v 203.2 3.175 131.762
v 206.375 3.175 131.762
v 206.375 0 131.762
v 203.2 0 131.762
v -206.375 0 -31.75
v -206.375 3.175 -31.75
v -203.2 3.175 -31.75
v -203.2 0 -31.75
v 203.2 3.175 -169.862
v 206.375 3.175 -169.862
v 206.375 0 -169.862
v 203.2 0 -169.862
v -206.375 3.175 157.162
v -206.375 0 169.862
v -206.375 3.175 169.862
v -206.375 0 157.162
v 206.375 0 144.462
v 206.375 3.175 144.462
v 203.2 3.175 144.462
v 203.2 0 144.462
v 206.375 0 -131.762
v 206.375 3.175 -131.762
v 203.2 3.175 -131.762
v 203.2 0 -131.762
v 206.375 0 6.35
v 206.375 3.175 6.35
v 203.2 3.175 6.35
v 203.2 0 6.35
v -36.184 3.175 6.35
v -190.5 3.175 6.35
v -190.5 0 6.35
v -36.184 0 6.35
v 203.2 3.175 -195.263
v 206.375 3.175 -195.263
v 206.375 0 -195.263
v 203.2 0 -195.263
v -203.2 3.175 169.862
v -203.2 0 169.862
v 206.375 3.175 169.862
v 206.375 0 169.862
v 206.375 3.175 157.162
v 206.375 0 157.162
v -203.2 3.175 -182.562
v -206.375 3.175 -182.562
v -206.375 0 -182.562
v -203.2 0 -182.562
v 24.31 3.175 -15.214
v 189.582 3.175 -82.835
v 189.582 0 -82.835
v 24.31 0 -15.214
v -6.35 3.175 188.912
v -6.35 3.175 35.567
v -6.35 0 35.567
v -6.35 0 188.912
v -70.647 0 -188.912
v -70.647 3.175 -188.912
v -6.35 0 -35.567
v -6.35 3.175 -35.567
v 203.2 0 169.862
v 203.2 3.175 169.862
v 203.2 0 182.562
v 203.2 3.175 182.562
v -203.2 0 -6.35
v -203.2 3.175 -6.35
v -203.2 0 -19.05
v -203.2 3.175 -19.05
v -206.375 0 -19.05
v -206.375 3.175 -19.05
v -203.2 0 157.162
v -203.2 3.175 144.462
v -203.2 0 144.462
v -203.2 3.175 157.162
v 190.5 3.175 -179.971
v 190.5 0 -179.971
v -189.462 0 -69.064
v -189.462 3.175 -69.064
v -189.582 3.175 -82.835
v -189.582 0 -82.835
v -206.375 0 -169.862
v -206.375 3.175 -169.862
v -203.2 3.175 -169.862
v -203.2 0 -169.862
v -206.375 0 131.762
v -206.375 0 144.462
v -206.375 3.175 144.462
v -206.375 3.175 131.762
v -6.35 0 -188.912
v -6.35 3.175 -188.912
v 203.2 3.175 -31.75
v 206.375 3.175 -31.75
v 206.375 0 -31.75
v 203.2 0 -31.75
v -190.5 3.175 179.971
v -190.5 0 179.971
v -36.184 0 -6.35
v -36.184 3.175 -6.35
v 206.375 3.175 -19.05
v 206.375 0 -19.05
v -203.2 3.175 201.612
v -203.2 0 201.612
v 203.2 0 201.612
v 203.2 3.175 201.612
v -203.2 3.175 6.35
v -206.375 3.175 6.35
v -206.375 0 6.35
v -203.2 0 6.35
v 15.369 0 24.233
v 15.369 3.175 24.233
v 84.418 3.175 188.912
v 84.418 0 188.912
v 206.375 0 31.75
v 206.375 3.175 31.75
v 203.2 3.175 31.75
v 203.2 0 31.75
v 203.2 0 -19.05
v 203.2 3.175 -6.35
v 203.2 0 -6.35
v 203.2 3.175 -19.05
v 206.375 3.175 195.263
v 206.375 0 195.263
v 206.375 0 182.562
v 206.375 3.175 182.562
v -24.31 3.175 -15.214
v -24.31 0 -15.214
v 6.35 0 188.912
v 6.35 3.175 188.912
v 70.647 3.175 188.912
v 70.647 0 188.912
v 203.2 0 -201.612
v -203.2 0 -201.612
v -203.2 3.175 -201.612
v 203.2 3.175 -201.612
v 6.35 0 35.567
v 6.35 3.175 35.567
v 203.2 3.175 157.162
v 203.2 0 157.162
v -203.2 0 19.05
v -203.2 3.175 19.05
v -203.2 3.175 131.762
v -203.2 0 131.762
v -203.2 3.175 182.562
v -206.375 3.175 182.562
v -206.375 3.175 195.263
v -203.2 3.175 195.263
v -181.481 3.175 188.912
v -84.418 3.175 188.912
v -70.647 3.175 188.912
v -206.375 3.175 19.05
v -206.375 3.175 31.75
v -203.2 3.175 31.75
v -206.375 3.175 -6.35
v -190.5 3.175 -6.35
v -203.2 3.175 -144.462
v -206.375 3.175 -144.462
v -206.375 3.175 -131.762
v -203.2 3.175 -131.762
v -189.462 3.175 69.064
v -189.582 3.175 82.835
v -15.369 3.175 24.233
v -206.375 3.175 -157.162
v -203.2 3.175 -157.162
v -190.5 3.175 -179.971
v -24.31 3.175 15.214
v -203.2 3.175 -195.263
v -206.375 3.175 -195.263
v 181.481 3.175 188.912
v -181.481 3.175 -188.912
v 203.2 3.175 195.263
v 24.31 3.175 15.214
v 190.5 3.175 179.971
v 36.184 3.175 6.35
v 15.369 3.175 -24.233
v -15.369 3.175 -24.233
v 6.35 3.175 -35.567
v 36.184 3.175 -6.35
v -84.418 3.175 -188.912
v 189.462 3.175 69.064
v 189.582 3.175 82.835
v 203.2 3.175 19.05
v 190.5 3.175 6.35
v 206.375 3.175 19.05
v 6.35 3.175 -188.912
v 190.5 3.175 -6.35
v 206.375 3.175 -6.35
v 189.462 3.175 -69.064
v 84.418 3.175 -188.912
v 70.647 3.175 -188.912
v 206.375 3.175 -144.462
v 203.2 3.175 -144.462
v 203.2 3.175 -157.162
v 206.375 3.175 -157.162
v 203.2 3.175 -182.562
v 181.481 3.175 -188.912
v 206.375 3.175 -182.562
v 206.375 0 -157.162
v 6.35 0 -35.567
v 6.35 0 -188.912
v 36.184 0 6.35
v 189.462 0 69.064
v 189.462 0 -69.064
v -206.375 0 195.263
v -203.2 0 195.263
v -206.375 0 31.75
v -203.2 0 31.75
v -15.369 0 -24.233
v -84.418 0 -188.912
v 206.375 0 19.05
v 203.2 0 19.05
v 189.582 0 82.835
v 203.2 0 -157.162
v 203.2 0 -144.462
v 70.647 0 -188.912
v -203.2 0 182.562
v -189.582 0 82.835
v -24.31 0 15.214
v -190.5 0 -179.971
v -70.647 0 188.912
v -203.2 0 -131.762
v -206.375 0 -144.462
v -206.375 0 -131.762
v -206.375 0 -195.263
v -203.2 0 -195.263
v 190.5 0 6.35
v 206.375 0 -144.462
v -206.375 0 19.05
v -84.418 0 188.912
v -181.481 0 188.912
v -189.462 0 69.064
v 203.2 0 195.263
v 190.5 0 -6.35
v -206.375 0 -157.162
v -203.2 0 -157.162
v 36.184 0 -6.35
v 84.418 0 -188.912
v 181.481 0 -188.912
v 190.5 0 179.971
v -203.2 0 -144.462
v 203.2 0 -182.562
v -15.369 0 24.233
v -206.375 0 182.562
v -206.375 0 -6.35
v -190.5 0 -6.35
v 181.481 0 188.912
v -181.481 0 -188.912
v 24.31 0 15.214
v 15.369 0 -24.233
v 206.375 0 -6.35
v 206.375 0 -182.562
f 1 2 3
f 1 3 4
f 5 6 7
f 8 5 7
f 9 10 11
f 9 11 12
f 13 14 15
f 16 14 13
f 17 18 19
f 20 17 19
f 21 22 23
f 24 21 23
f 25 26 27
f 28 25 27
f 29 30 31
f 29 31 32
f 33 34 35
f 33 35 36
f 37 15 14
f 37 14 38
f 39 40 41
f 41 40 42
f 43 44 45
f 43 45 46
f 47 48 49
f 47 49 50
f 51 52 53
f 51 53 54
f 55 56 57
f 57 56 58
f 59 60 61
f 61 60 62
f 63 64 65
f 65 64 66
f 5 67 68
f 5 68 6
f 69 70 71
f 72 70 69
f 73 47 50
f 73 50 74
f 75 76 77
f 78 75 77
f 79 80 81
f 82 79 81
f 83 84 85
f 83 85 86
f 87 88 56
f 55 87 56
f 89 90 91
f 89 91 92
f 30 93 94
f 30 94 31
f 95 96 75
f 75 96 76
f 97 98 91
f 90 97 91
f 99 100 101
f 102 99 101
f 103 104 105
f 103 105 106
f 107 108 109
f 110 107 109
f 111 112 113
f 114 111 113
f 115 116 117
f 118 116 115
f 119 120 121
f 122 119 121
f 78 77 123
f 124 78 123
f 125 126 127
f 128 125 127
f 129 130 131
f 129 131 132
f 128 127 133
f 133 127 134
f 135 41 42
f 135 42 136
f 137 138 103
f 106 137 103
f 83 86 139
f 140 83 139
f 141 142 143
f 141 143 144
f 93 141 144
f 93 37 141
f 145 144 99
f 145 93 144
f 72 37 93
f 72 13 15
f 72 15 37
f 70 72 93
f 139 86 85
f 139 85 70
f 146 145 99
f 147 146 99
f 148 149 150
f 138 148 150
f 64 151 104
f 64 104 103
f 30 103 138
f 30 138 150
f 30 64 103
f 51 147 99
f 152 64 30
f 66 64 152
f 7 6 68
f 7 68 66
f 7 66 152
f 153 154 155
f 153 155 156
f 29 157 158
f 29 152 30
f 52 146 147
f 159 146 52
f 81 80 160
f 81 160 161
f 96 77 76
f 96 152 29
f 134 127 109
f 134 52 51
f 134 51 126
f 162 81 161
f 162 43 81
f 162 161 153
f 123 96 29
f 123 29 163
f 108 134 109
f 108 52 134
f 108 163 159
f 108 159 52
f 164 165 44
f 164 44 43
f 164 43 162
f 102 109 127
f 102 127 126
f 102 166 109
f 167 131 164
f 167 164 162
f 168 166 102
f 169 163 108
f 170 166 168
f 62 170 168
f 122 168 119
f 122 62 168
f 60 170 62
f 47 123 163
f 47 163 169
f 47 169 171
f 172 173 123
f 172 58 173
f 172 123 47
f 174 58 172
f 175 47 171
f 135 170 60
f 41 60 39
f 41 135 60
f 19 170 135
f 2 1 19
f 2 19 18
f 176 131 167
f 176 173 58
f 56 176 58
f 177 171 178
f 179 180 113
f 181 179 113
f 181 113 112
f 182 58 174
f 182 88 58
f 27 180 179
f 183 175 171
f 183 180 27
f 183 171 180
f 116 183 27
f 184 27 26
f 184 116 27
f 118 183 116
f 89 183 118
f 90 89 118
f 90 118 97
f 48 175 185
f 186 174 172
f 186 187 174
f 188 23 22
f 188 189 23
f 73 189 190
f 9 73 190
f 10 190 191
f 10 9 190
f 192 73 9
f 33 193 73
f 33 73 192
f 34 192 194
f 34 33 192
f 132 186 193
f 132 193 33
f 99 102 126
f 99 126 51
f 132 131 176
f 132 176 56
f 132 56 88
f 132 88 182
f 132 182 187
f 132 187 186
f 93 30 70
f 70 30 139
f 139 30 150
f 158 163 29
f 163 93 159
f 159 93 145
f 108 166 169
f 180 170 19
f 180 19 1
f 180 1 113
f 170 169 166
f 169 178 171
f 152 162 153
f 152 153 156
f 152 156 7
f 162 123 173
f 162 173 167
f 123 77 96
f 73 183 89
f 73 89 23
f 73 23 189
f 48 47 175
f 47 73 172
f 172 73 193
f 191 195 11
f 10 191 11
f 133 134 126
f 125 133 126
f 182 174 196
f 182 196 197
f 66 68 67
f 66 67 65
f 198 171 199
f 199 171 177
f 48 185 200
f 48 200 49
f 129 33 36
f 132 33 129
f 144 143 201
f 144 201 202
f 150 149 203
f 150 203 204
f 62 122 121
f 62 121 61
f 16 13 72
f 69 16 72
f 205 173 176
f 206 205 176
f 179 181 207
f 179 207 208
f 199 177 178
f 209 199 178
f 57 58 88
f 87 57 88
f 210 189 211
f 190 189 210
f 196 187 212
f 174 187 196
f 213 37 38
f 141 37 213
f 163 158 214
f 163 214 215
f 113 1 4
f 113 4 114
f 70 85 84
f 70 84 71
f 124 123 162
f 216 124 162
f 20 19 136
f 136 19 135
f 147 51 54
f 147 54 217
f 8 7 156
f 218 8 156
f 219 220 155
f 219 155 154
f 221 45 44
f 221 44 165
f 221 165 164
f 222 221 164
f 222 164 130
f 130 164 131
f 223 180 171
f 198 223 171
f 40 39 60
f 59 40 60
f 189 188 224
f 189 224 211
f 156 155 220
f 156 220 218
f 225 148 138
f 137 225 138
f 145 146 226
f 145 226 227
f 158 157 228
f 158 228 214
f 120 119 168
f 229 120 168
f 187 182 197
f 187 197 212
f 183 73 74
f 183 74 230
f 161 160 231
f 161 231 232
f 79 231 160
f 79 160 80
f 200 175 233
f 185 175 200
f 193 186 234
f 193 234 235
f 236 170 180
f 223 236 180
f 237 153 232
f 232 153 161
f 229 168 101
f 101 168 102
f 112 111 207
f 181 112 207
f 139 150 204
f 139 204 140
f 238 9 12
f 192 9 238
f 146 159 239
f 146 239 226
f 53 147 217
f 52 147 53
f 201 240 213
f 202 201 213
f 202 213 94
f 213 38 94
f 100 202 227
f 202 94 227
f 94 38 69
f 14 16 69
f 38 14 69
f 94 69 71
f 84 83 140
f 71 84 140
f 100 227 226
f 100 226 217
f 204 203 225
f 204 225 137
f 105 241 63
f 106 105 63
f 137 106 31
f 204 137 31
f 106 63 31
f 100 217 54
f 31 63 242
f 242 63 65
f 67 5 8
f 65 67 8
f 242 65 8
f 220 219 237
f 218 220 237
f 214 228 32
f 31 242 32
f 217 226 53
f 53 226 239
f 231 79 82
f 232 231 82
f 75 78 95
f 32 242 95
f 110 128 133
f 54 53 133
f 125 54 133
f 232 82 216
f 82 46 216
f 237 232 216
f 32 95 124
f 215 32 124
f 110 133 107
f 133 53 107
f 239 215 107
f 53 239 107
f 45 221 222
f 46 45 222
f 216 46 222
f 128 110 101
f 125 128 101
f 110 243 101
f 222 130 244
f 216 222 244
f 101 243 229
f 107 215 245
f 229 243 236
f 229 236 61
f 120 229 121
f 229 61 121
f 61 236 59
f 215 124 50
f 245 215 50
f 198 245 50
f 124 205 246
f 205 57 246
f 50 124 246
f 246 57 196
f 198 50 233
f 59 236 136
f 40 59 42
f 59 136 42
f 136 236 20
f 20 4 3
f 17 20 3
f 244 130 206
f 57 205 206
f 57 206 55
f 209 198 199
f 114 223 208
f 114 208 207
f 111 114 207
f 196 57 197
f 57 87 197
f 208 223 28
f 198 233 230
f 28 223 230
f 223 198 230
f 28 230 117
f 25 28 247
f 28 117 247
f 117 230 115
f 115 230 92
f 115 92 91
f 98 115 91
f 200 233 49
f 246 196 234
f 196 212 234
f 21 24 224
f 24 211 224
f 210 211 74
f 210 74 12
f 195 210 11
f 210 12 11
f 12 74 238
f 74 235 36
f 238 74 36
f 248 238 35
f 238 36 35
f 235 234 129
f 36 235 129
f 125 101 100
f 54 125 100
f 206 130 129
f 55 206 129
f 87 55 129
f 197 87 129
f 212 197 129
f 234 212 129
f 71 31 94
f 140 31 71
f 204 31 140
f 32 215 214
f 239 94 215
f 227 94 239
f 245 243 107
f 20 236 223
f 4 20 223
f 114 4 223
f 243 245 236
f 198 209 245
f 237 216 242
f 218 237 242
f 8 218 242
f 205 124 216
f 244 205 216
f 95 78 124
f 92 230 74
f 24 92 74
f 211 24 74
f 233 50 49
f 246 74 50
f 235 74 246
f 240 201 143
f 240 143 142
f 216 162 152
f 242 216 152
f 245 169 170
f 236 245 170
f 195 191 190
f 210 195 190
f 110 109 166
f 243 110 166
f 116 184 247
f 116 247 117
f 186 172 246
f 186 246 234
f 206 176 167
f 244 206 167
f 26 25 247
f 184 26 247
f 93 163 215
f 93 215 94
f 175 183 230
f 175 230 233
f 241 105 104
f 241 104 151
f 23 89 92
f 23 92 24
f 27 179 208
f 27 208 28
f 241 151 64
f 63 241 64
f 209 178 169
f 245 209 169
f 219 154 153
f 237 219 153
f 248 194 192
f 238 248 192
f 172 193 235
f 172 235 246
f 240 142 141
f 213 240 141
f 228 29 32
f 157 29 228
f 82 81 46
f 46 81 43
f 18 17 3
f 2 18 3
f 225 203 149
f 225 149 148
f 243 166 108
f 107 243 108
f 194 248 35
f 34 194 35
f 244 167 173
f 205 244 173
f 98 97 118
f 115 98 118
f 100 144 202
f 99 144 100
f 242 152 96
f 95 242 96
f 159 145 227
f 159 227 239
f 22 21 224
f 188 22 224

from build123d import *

# Parameters (mm, degrees)
SKETCH1_W               = 412.75
SKETCH1_H               = 403.225
BOSS_EXTRUDE1_DEPTH     = 3.175
SKETCH2_W               = 3.175
SKETCH2_H               = 87.3125
CUT_EXTRUDE1_DEPTH      = 3.175
SKETCH3_W               = 3.175
SKETCH3_H               = 12.7
CUT_EXTRUDE2_DEPTH      = 3.175
SKETCH4_W               = 3.175
SKETCH4_H               = 12.7
CUT_EXTRUDE3_DEPTH      = 3.175
MIRROR2_COPY_1_SKETCH_W = 3.175
MIRROR2_COPY_1_SKETCH_H = 12.7
MIRROR2_COPY_1_DEPTH    = 3.175
CUT_EXTRUDE4_DEPTH      = 3.175
MIRROR4_COPY_1_DEPTH    = 3.175


with BuildPart() as part:
    # Sketch1 → Boss-Extrude1 (new body)
    with BuildSketch(Plane(origin=(0, 0, 0), x_dir=(1, 0, 0), z_dir=(0, 1, 0))):
        Rectangle(SKETCH1_W, SKETCH1_H)
    extrude(amount=BOSS_EXTRUDE1_DEPTH)

    # Sketch2 → Cut-Extrude1 (cut)
    with BuildSketch(Plane(origin=(0, 3.175, 0), x_dir=(1, 0, 0), z_dir=(0, 1, 0))):
        with Locations((-204.7875, 81.75625)):
            Rectangle(SKETCH2_W, SKETCH2_H)
        with Locations((-204.7875, -81.75625)):
            Rectangle(SKETCH2_W, SKETCH2_H)
    cut_extrude1 = extrude(amount=-CUT_EXTRUDE1_DEPTH, mode=Mode.SUBTRACT)

    # Sketch3 → Cut-Extrude2 (cut)
    with BuildSketch(Plane(origin=(0, 3.175, 0), x_dir=(1, 0, 0), z_dir=(0, 1, 0))):
        with Locations((-204.7875, 201.6125)):
            Rectangle(SKETCH3_W, SKETCH3_H)
        with Locations((-204.7875, 176.2125)):
            Rectangle(SKETCH3_W, SKETCH3_H)
        with Locations((-204.7875, 150.8125)):
            Rectangle(SKETCH3_W, SKETCH3_H)
        with Locations((-204.7875, 125.4125)):
            Rectangle(SKETCH3_W, SKETCH3_H)
    cut_extrude2 = extrude(amount=-CUT_EXTRUDE2_DEPTH, mode=Mode.SUBTRACT)

    # Sketch4 → Cut-Extrude3 (cut)
    with BuildSketch(Plane(origin=(0, 3.175, 0), x_dir=(1, 0, 0), z_dir=(0, 1, 0))):
        with Locations((-204.7875, 38.1)):
            Rectangle(SKETCH4_W, SKETCH4_H)
        with Locations((-204.7875, 12.7)):
            Rectangle(SKETCH4_W, SKETCH4_H)
        with Locations((-204.7875, -12.7)):
            Rectangle(SKETCH4_W, SKETCH4_H)
        with Locations((-204.7875, -38.1)):
            Rectangle(SKETCH4_W, SKETCH4_H)
    cut_extrude3 = extrude(amount=-CUT_EXTRUDE3_DEPTH, mode=Mode.SUBTRACT)

    # Mirror1: Cut-Extrude2 across plane
    add(cut_extrude2.mirror(Plane.XY), mode=Mode.SUBTRACT)

    # Mirror2: Cut-Extrude1, Cut-Extrude2, Cut-Extrude3 across plane
    add(cut_extrude1.mirror(Plane(origin=(0, 0, 0), x_dir=(0, 0, 1), z_dir=(1, 0, 0))), mode=Mode.SUBTRACT)
    add(cut_extrude2.mirror(Plane(origin=(0, 0, 0), x_dir=(0, 0, 1), z_dir=(1, 0, 0))), mode=Mode.SUBTRACT)
    add(cut_extrude3.mirror(Plane(origin=(0, 0, 0), x_dir=(0, 0, 1), z_dir=(1, 0, 0))), mode=Mode.SUBTRACT)

    # Mirror2 copy 1 sketch → Mirror2 copy 1 (cut)
    with BuildSketch(Plane(origin=(0, 3.175, 0), x_dir=(-1, 0, 0), z_dir=(0, 1, 0))):
        with Locations((-204.7875, 201.6125)):
            Rectangle(MIRROR2_COPY_1_SKETCH_W, MIRROR2_COPY_1_SKETCH_H)
        with Locations((-204.7875, 176.2125)):
            Rectangle(MIRROR2_COPY_1_SKETCH_W, MIRROR2_COPY_1_SKETCH_H)
        with Locations((-204.7875, 150.8125)):
            Rectangle(MIRROR2_COPY_1_SKETCH_W, MIRROR2_COPY_1_SKETCH_H)
        with Locations((-204.7875, 125.4125)):
            Rectangle(MIRROR2_COPY_1_SKETCH_W, MIRROR2_COPY_1_SKETCH_H)
    extrude(amount=-MIRROR2_COPY_1_DEPTH, mode=Mode.SUBTRACT)

    # Sketch5 → Cut-Extrude4 (cut)
    with BuildSketch(Plane(origin=(0, 3.175, 0), x_dir=(1, 0, 0), z_dir=(0, 1, 0))):
        Polygon((-190.5, 6.35), (-36.183770369, 6.35), (-189.462331729, 69.064060773), (-189.581560693, 82.834747968), (-24.310343952, 15.213881497), (-190.5, 179.970868096), align=None)
        Polygon((-181.480614775, 188.9125), (-15.369047179, 24.232928676), (-84.41827204, 188.9125), align=None)
        Polygon((-70.647068702, 188.9125), (-6.35, 35.566626349), (-6.35, 188.9125), align=None)
    cut_extrude4 = extrude(amount=-CUT_EXTRUDE4_DEPTH, mode=Mode.SUBTRACT)

    # Mirror3: Cut-Extrude4 across plane
    add(cut_extrude4.mirror(Plane(origin=(0, 0, 0), x_dir=(0, 0, 1), z_dir=(1, 0, 0))), mode=Mode.SUBTRACT)

    # Mirror4: Cut-Extrude4 across plane
    add(cut_extrude4.mirror(Plane.XY), mode=Mode.SUBTRACT)

    # Mirror4 copy 1 sketch → Mirror4 copy 1 (cut)
    with BuildSketch(Plane(origin=(0, 3.175, 0), x_dir=(-1, 0, 0), z_dir=(0, 1, 0))):
        Polygon((-190.5, 6.35), (-36.183770369, 6.35), (-189.462331729, 69.064060773), (-189.581560693, 82.834747968), (-24.310343952, 15.213881497), (-190.5, 179.970868096), align=None)
        Polygon((-181.480614775, 188.9125), (-15.369047179, 24.232928676), (-84.41827204, 188.9125), align=None)
        Polygon((-70.647068702, 188.9125), (-6.35, 35.566626349), (-6.35, 188.9125), align=None)
    extrude(amount=-MIRROR4_COPY_1_DEPTH, mode=Mode.SUBTRACT)


solid = part.part
